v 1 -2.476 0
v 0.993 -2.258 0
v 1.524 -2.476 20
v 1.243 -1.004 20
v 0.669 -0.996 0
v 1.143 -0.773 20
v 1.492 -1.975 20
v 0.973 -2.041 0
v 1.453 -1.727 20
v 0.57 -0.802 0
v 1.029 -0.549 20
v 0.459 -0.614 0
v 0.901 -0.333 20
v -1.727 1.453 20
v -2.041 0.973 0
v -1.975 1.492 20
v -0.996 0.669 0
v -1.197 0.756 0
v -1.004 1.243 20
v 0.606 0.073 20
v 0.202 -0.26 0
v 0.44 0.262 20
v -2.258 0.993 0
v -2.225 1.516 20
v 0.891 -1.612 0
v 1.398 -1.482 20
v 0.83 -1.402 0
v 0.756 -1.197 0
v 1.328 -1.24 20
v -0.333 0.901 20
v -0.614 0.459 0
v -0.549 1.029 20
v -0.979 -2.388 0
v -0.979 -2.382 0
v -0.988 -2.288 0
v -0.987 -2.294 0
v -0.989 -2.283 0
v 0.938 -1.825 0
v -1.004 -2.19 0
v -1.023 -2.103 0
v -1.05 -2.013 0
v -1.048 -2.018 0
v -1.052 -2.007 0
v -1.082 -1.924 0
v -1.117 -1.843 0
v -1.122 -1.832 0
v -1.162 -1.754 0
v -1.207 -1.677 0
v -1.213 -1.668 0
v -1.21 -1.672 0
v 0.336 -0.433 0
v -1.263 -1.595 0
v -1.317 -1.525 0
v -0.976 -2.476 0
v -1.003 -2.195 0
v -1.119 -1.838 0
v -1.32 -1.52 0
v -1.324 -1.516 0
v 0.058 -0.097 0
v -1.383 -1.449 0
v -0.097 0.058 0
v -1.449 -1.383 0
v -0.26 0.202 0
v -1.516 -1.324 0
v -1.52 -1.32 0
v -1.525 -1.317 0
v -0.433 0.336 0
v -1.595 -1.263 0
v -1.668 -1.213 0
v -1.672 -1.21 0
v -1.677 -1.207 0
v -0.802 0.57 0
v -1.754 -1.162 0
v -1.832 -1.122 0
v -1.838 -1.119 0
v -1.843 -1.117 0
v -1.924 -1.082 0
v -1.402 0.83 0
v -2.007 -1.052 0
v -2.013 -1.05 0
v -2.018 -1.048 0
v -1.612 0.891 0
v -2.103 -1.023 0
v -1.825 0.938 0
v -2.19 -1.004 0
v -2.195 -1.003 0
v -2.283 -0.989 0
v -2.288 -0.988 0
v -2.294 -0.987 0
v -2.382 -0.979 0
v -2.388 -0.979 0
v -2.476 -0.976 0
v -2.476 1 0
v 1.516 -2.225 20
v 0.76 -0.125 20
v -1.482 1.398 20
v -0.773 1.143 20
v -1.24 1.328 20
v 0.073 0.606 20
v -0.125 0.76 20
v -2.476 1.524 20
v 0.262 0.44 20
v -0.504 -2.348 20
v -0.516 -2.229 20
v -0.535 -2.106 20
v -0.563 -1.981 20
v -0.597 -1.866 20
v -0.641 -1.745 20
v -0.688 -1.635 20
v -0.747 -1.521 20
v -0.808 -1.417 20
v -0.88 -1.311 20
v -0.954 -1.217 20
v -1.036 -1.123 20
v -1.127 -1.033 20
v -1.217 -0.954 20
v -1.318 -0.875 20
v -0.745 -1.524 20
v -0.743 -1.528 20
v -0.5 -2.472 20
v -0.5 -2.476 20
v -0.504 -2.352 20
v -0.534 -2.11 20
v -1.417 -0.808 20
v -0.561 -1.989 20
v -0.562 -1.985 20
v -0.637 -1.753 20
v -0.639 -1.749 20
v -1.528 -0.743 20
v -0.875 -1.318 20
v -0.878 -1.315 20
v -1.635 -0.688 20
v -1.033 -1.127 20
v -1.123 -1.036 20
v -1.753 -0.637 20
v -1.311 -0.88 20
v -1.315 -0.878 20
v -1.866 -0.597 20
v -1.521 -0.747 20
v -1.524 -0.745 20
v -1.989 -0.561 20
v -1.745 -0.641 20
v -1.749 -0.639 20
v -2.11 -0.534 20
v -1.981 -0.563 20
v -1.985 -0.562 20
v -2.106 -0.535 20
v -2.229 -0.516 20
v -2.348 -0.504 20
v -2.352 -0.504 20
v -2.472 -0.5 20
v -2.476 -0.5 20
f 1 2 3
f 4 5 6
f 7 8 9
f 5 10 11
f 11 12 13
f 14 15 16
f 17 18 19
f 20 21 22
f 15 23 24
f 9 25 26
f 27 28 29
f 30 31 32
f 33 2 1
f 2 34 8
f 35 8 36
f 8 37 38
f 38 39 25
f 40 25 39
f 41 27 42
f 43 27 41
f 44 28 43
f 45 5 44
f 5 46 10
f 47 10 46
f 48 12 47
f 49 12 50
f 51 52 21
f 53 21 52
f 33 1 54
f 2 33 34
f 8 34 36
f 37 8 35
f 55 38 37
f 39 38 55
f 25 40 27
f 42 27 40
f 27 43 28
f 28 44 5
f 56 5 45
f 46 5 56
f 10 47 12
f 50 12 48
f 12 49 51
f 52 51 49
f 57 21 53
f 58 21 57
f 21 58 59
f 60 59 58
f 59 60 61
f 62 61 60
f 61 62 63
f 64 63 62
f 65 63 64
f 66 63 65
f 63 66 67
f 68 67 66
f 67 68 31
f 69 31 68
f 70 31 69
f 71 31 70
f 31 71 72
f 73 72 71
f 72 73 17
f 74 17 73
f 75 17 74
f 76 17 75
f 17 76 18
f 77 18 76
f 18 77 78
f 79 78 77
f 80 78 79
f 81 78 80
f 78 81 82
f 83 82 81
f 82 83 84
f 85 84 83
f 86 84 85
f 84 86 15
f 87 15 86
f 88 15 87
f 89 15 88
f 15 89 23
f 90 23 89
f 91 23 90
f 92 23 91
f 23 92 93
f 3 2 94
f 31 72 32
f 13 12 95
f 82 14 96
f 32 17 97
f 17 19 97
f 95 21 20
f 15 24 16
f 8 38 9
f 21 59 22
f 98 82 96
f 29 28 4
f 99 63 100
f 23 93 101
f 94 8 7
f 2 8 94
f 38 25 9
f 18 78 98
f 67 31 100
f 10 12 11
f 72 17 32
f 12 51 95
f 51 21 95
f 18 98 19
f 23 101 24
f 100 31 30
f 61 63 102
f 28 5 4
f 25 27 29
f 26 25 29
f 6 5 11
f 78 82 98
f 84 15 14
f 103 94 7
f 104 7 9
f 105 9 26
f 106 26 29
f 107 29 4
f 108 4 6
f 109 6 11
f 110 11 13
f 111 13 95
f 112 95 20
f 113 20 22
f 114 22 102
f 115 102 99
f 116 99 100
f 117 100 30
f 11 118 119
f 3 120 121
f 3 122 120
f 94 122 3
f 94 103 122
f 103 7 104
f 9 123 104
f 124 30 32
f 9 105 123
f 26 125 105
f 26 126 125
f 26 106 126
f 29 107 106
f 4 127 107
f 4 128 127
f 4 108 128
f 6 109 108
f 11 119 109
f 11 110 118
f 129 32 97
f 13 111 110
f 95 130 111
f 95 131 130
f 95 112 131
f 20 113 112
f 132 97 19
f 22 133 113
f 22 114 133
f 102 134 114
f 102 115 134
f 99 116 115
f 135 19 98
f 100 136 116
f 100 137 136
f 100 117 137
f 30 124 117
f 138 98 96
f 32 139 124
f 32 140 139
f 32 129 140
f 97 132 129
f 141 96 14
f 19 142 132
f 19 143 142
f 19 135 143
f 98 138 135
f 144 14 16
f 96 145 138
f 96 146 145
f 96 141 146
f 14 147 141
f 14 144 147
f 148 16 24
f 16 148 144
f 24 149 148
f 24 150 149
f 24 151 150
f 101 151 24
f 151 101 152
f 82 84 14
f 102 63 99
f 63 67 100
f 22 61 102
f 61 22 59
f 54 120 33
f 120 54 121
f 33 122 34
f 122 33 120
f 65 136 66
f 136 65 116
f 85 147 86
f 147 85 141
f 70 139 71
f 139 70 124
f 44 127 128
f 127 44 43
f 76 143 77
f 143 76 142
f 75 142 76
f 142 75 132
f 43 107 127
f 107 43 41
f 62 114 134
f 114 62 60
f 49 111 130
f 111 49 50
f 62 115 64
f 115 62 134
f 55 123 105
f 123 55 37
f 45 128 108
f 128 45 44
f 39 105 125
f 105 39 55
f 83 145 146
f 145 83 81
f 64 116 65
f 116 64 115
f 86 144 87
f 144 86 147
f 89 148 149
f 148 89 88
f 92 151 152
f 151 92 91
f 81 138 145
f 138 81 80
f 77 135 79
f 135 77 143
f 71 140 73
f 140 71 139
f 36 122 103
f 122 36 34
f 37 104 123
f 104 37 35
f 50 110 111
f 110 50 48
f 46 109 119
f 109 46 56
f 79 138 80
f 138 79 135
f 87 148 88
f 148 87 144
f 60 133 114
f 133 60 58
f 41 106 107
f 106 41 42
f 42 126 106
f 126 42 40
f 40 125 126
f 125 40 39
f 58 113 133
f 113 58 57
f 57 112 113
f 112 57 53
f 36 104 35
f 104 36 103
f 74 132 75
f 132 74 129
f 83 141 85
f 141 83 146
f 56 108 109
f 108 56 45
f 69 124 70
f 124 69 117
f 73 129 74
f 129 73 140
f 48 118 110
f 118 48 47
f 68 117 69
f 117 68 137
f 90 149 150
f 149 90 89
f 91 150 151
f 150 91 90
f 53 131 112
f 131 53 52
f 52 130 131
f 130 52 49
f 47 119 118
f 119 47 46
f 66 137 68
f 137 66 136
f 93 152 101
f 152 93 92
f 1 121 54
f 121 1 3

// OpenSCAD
union() {
	translate(v = [-2.4762815686, -2.4762815686, 10.0000000000]) {
		intersection() {
			translate(v = [0, 0, -11.0000000000]) {
				cube(size = [4.0000000000, 4.0000000000, 22]);
			}
			difference() {
				cylinder($fn = 100, center = true, h = 20, r1 = 3.4762815686, r2 = 4.0000000000);
				cylinder($fn = 100, center = true, h = 22, r1 = 1.4762815686, r2 = 2.0000000000);
			}
		}
	}
	translate(v = [-2.4762815686, 0, 0]) {
		polyhedron(faces = [[0, 1, 2, 3], [4, 5, 6, 7], [2, 3, 7, 6], [0, 1, 5, 4], [0, 3, 7, 4], [1, 2, 6, 5]], points = [[0, -1.0000000000, 0], [0, 1.0000000000, 0], [-20, 1.0000000000, 0], [-20, -1.0000000000, 0], [0, -0.4762815686, 20], [0, 1.5237184314, 20], [-20, 1.5237184314, 20], [-20, -0.4762815686, 20]]);
	}
}
